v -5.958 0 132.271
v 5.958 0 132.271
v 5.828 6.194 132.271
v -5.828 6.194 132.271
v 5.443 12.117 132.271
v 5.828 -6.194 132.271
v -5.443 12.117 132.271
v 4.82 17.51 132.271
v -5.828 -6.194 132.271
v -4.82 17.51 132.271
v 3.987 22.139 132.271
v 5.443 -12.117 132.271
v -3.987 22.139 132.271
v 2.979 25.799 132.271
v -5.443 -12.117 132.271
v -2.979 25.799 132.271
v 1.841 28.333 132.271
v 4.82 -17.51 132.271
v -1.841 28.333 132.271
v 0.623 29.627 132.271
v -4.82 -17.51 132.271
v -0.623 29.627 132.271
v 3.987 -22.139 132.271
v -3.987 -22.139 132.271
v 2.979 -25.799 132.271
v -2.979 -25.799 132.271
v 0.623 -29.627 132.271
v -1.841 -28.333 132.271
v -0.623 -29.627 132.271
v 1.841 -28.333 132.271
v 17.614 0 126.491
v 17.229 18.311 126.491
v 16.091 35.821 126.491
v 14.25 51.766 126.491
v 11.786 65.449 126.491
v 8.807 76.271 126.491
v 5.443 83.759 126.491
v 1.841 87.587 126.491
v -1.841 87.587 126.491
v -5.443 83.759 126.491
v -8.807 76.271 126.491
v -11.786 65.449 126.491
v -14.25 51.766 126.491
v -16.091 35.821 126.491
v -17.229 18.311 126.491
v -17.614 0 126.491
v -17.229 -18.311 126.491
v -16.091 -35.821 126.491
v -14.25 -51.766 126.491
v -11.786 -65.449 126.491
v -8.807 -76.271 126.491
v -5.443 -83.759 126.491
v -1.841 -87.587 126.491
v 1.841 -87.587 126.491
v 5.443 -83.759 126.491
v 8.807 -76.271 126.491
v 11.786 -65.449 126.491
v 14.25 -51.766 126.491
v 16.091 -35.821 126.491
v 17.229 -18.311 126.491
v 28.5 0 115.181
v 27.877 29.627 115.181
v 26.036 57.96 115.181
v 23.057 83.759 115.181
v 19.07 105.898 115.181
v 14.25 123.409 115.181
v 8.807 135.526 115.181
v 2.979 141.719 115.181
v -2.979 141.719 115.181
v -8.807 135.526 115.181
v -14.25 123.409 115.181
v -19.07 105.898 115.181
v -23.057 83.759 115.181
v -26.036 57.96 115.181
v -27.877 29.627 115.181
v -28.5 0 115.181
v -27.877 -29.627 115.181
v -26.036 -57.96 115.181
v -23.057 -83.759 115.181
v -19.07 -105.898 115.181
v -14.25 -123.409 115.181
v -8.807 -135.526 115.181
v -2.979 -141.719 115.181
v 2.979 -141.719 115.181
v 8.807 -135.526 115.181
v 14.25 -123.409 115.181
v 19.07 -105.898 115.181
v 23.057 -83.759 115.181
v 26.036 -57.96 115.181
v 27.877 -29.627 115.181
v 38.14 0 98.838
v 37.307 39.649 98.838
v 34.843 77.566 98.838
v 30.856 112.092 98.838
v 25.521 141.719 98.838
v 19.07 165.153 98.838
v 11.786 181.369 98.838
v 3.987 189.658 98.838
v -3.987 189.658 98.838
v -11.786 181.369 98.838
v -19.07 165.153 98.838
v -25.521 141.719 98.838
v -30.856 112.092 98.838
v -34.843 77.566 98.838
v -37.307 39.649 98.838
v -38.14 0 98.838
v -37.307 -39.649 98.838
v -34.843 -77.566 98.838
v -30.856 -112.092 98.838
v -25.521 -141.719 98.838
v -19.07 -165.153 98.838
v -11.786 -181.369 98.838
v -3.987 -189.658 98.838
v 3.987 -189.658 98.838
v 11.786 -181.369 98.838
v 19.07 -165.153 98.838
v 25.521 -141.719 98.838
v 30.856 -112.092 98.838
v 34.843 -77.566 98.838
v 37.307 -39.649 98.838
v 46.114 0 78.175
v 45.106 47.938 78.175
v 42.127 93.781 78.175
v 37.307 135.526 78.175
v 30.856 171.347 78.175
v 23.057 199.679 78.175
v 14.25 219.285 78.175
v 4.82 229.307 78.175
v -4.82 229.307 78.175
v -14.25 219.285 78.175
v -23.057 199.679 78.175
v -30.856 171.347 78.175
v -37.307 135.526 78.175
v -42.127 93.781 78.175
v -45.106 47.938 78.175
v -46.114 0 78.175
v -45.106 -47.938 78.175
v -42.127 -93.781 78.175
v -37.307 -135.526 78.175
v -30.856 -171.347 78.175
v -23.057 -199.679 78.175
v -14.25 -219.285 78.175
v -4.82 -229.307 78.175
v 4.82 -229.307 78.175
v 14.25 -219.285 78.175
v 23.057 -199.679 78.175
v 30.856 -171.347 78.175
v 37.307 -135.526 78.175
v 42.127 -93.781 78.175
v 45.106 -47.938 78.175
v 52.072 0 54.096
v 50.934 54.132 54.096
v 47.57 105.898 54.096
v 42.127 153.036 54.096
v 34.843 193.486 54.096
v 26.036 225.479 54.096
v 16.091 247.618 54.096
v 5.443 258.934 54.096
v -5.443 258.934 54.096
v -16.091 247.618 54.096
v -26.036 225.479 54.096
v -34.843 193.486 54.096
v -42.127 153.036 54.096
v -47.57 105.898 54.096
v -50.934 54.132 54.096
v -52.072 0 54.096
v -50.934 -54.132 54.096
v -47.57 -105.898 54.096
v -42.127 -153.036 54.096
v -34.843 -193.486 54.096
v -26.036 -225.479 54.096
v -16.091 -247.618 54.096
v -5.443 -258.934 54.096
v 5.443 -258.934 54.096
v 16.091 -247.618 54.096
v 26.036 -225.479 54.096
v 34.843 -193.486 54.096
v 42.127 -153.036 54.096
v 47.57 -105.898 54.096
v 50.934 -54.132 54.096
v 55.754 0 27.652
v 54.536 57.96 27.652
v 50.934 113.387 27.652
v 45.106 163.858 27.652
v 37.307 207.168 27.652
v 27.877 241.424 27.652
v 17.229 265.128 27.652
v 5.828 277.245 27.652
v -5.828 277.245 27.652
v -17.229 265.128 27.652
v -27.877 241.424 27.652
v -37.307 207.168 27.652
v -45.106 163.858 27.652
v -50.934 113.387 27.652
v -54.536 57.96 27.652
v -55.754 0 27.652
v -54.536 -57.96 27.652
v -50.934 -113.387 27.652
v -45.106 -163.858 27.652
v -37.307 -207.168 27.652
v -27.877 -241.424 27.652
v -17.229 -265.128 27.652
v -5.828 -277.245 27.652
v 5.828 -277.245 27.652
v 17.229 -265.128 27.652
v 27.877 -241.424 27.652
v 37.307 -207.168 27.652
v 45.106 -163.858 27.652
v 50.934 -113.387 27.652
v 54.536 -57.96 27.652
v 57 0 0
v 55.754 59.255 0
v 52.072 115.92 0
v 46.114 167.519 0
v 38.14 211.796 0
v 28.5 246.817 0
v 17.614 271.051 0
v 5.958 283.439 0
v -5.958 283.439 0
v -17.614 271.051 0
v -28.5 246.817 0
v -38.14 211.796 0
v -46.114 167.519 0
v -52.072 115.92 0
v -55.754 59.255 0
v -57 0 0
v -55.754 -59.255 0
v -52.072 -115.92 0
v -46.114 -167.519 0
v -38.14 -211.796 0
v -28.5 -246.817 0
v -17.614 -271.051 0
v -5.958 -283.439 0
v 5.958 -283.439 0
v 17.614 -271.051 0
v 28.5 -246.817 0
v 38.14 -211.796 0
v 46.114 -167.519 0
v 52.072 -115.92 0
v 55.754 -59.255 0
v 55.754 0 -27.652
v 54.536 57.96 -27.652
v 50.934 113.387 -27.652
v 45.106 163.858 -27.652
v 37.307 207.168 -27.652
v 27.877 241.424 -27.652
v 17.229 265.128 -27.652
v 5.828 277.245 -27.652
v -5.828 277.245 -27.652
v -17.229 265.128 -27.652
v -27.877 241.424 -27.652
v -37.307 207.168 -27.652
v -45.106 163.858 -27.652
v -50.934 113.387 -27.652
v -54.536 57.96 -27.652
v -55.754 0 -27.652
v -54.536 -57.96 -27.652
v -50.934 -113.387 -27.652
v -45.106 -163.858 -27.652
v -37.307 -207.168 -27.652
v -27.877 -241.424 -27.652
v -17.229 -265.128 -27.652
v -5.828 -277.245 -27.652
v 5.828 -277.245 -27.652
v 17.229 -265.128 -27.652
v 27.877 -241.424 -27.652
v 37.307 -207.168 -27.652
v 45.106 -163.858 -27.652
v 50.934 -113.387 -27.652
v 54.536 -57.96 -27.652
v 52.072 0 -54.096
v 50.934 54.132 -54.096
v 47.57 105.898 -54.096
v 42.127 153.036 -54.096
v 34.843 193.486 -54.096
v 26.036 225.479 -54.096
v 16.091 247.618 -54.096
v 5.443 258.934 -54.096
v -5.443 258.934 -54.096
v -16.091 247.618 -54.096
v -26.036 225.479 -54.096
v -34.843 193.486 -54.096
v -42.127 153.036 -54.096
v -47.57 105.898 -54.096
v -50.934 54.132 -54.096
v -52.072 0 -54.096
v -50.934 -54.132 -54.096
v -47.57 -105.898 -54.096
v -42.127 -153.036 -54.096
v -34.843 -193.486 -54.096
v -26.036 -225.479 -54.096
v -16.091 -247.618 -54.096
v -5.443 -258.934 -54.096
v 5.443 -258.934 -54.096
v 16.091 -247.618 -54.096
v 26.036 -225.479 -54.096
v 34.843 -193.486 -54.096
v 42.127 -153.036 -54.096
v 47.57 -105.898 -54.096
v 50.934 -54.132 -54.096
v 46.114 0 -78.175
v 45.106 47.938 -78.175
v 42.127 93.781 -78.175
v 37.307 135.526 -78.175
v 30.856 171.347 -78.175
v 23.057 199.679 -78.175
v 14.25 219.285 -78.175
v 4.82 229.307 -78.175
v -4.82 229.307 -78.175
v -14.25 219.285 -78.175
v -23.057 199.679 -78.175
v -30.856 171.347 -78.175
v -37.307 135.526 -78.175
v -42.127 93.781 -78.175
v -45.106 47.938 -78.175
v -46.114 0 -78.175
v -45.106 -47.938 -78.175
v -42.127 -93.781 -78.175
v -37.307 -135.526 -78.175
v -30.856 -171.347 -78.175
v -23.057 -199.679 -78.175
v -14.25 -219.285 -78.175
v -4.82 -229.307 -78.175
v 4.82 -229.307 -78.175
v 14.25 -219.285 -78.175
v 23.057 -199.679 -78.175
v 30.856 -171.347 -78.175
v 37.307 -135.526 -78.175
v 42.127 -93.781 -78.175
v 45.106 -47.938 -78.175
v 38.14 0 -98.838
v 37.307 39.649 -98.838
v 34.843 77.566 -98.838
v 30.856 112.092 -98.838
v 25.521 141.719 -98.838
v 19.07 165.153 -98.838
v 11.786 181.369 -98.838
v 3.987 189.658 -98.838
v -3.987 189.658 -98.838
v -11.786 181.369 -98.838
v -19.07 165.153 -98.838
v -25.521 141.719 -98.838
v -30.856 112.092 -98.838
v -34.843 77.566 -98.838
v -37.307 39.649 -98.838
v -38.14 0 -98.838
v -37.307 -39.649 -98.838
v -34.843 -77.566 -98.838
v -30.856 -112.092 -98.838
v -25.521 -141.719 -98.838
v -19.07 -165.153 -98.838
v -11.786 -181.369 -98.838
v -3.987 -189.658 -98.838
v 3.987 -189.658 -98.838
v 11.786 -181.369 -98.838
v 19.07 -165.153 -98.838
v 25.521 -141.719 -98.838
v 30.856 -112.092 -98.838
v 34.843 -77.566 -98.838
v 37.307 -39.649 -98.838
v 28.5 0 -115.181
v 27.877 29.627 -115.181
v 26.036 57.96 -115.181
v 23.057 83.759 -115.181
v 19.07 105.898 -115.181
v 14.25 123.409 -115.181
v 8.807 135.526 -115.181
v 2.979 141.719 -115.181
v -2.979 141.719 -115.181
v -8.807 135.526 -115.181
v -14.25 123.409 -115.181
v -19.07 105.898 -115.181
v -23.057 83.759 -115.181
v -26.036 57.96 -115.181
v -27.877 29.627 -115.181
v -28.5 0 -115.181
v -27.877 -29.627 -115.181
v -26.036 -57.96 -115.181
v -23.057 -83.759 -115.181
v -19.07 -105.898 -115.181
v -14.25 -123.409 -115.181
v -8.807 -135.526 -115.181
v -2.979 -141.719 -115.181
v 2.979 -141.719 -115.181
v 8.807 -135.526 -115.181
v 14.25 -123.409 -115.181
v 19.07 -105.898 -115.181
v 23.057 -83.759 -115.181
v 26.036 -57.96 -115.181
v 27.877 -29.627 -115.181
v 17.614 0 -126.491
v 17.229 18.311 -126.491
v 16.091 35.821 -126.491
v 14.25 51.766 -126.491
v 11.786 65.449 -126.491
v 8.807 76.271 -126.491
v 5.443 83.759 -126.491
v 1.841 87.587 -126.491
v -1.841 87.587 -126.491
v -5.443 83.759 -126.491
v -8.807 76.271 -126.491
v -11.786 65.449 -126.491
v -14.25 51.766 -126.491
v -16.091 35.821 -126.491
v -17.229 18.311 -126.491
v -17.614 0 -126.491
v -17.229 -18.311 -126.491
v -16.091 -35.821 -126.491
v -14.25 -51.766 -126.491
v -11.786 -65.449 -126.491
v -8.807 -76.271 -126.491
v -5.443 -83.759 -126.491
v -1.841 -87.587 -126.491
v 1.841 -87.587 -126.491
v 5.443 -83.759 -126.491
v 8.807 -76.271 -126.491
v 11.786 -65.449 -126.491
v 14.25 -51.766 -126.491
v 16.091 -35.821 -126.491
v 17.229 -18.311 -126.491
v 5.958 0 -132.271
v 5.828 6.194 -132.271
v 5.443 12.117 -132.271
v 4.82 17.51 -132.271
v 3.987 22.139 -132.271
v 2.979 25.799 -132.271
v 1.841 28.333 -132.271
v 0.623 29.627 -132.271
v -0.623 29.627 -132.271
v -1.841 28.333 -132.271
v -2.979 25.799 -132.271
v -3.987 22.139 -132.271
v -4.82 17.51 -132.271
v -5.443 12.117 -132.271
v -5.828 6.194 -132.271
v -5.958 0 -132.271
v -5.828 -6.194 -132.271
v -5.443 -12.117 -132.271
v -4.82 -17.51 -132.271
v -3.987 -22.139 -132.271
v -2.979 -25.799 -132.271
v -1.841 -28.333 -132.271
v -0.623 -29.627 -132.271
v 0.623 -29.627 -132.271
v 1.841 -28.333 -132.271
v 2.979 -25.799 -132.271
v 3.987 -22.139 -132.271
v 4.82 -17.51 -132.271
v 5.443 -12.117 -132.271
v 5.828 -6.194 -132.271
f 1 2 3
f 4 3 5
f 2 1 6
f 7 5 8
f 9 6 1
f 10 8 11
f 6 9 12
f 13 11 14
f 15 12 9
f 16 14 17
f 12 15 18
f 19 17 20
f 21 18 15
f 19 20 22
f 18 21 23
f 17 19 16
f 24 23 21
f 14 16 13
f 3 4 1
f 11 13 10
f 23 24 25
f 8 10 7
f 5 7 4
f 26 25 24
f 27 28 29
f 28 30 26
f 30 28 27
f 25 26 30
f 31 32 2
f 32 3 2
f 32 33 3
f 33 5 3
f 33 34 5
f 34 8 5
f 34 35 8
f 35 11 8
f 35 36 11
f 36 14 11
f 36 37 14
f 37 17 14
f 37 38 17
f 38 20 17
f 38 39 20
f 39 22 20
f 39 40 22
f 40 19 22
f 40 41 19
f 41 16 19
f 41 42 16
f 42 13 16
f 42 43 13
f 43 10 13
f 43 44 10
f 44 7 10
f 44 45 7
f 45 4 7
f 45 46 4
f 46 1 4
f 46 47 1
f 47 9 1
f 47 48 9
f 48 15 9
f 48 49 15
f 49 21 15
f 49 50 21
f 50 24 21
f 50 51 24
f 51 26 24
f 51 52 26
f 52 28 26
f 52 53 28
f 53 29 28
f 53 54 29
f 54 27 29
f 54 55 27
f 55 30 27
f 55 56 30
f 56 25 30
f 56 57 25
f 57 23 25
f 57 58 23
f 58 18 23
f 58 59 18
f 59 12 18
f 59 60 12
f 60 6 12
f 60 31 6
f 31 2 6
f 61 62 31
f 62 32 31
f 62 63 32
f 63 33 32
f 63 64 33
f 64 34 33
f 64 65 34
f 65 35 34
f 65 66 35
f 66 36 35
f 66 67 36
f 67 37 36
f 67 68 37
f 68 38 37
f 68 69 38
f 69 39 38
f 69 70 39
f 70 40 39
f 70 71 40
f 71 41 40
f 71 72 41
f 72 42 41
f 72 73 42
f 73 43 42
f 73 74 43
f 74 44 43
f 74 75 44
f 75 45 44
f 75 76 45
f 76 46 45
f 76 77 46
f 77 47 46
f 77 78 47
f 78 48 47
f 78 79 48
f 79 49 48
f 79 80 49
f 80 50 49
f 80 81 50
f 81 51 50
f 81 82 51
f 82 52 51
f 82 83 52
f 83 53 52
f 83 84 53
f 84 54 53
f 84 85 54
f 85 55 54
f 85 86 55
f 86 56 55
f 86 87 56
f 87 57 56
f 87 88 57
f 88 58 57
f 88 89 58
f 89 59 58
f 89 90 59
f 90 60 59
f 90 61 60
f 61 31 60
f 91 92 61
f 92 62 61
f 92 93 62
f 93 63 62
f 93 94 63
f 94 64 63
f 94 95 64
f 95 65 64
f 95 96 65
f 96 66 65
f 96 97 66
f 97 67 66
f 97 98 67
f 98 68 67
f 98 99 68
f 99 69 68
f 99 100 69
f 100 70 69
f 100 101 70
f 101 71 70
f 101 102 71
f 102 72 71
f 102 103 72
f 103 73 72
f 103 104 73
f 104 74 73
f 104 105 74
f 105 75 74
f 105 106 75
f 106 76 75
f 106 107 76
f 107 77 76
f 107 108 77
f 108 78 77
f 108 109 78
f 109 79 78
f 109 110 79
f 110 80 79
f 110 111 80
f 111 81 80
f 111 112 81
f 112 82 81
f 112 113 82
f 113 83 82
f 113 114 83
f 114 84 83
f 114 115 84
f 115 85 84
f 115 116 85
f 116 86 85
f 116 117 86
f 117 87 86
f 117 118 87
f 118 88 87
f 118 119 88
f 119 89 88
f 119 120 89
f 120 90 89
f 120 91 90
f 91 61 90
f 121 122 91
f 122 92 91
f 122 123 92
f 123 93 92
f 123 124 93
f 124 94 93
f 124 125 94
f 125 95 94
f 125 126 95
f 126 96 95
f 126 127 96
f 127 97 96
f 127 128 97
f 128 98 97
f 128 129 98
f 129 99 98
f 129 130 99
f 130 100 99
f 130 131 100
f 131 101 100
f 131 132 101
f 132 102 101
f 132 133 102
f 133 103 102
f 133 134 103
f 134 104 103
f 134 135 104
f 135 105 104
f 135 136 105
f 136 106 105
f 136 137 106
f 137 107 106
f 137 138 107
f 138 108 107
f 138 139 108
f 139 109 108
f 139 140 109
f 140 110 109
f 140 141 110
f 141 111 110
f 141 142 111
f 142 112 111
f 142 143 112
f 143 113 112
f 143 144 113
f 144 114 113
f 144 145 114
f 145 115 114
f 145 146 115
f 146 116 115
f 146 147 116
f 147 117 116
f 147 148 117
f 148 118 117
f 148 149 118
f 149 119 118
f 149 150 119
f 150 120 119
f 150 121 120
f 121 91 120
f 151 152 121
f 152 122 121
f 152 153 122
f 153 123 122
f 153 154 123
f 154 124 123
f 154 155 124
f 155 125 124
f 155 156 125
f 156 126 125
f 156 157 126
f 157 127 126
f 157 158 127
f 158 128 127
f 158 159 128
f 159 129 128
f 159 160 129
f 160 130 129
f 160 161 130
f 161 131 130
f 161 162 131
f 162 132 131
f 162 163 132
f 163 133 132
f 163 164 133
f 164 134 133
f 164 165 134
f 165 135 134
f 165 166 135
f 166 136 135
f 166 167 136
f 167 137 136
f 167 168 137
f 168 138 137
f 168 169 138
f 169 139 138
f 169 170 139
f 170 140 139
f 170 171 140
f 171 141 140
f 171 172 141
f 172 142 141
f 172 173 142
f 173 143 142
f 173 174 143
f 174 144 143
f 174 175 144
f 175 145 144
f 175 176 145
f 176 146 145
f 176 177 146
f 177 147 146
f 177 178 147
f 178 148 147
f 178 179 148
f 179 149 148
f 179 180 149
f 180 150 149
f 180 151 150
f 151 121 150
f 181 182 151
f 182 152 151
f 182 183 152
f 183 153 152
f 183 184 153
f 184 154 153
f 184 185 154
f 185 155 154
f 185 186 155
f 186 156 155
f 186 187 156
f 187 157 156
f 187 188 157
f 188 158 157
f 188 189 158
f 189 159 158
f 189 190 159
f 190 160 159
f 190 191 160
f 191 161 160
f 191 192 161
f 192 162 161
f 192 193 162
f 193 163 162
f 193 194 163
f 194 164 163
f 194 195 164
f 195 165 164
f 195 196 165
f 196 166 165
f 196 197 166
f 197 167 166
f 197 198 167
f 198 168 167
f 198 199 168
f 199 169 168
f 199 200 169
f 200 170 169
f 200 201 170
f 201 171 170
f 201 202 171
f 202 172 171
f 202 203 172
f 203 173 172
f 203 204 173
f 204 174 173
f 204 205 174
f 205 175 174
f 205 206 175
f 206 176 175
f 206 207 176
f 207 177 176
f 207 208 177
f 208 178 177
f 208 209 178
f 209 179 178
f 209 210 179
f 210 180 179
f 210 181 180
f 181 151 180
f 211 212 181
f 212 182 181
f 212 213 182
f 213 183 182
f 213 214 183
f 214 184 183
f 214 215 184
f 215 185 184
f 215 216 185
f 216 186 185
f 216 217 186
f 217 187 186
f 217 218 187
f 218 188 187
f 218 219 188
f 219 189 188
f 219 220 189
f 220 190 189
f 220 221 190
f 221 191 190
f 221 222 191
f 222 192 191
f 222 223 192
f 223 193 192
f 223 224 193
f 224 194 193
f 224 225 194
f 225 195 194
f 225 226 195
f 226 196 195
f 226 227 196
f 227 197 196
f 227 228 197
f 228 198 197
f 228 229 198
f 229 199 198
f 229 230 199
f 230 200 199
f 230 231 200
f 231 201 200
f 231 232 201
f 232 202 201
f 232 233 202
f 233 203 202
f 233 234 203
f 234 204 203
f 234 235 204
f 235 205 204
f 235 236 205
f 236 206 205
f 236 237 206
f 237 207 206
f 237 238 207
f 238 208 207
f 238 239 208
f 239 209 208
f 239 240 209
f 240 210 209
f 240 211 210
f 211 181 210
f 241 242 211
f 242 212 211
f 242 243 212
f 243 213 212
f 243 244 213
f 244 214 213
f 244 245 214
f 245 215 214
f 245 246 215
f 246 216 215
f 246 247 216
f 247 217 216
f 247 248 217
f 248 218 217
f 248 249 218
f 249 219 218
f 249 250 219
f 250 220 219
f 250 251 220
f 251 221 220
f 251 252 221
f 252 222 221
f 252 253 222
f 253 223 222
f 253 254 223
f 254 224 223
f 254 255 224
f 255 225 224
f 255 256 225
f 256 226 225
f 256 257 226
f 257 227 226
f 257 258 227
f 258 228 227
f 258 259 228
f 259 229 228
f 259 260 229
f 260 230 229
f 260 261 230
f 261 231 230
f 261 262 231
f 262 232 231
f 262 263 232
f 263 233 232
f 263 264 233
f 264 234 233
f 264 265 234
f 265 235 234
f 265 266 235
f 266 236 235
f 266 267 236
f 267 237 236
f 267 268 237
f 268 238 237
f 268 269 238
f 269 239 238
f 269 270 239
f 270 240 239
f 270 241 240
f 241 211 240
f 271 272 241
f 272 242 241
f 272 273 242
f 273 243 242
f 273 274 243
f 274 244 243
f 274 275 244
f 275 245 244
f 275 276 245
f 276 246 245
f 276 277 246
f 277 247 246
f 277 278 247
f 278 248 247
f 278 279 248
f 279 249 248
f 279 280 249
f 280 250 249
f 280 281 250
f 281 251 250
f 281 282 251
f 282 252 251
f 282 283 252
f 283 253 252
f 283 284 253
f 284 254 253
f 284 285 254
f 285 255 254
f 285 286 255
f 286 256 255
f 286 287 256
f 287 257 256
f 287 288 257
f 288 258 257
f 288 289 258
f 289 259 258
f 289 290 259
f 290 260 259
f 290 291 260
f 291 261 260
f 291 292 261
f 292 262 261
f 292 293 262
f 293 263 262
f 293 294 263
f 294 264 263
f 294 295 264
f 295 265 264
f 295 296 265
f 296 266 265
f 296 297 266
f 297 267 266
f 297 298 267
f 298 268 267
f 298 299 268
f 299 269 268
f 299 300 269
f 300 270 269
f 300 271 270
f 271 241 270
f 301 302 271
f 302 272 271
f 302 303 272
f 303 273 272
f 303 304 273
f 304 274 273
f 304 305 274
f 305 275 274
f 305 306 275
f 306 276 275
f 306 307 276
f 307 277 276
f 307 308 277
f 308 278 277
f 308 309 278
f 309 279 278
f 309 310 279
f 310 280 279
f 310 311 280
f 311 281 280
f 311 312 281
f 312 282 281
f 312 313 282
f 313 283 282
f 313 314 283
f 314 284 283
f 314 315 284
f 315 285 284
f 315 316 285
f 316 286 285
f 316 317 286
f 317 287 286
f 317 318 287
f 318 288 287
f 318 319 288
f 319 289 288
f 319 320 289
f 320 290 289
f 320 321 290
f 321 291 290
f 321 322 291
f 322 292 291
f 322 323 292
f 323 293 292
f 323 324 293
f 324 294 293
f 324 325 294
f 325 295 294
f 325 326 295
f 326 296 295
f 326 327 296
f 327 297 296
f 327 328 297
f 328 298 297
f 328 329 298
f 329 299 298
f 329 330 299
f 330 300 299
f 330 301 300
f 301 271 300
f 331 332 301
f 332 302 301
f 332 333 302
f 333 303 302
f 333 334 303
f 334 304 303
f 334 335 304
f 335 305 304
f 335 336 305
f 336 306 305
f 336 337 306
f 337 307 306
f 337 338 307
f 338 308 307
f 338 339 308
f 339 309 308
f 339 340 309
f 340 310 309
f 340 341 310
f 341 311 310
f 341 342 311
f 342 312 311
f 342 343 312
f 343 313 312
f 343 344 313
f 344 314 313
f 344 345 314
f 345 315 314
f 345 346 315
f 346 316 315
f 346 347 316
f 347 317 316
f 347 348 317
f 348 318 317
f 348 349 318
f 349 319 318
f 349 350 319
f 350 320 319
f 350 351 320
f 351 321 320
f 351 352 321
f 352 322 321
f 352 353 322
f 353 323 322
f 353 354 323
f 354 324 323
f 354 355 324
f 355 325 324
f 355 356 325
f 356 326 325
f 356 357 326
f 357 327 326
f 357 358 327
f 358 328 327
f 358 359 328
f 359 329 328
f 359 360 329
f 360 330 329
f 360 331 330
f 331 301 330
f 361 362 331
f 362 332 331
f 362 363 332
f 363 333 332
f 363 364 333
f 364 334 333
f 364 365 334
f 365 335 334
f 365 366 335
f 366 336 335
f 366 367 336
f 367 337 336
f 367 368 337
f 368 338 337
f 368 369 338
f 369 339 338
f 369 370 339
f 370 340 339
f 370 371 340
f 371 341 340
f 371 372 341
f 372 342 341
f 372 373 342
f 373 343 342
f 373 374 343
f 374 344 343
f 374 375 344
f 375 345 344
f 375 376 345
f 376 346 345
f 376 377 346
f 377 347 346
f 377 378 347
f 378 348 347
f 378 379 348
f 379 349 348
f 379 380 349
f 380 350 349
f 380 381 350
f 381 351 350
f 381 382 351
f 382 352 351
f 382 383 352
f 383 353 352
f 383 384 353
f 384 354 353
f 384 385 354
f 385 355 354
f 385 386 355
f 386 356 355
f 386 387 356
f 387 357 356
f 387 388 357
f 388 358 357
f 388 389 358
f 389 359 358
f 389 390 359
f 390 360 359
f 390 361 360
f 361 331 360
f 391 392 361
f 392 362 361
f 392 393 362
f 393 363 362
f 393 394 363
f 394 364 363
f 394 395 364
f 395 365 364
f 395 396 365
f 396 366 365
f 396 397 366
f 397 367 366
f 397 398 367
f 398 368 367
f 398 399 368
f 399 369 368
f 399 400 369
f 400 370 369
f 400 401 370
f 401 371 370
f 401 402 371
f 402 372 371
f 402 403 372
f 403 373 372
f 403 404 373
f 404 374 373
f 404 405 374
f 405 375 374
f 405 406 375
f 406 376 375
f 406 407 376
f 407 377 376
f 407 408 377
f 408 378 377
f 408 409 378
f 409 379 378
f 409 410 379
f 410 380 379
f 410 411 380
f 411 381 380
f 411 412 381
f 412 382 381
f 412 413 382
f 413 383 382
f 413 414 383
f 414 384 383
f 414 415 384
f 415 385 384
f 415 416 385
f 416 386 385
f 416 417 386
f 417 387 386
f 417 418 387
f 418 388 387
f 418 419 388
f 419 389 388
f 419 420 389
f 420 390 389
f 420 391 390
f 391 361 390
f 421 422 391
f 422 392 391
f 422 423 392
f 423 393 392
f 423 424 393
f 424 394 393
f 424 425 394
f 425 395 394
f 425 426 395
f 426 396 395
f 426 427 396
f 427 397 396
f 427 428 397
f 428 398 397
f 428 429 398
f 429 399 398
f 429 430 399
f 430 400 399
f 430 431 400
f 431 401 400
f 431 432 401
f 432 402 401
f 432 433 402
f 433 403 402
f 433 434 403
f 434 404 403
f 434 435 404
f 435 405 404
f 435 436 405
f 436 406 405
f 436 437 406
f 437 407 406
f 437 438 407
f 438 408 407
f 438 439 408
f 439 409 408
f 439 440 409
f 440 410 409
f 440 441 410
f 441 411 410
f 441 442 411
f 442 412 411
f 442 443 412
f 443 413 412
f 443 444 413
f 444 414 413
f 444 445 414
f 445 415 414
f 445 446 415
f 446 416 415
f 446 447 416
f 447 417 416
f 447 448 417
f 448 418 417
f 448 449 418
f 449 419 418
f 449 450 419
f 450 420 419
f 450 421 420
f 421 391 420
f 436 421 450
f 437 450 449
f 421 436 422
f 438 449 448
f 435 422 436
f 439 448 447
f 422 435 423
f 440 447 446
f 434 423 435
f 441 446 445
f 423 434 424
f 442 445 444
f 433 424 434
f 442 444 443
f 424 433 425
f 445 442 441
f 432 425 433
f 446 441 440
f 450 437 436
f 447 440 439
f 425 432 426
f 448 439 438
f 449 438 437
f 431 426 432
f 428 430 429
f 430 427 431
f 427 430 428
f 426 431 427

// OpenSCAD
// Generated by SolidPython 1.0.1 on 2020-07-29 00:46:45


scale(v = [3, 15, 7]) {
	sphere(r = 19);
}
/***********************************************
*********      SolidPython code:      **********
************************************************
 
# import packages: SolidPython
from solid import *
from solid.utils import *
from itertools import chain, combinations, permutations


class Resize:

    def __init__(self, scad_file):
        self.scad_file = scad_file
        #self.scad_file = import_scad(scad_file)
        # cone/cylinder param:
        self.r1 = 0
        self.r2 = 0
        self.h = 0
        # rectangular prism param:
        self.w = 0
        self.l = 0
        # ellipse param:
        self.r = 0

    # import OpenScad code (file name corresponds to shape)


    # classify shape + parameters
    def assign(self, param1, param2, param3):
        if self.scad_file == 'cone.scad':
            self.r1 = param1
            self.r2 = param2
            self.h = param3
        elif self.scad_file == 'cylinder.scad':
            self.r1 = param1
            self.r2 = param2
            self.h = param3
        elif self.scad_file == 'rectangularPrism.scad':
            self.h = param1
            self.l = param2
            self.w = param3
        else:
            self.r = param1
            self.h = param2

    # resize parameters
    def iterate(self):
        x = range(3, 20, 2)
        i = 1
        if self.scad_file == 'cone.scad':
            tempList = list(permutations(x, 2))
            for temp in tempList:
                param1 = temp[0]
                param2 = temp[1]
                filepath = 'produced_scad_files/' + 'cone' + str(param1) + '_' + str(param2) + '_' + '.scad'
                scad_render_to_file(cylinder(h=param1, r1=param2, r2=0), filepath)

        elif self.scad_file == 'cylinder.scad':
            tempList = list(permutations(x, 3))
            for temp in tempList:
                param1 = temp[0]
                param2 = temp[1]
                filepath = 'produced_scad_files/' + 'cylinder' + str(param1) + '_' + str(param2) + '_' + '.scad'
                scad_render_to_file(cylinder(h=param1, r1=param2, r2=param2), filepath)

        elif self.scad_file == 'rectangularPrism.scad':
            tempList = list(permutations(x, 3))
            for temp in tempList:
                param1 = temp[0]
                param2 = temp[1]
                param3 = temp[2]
                filepath = 'produced_scad_files/' + 'rectangularPrism' + str(param1) + '_' + str(param2) + '_' + str(
                    param3) + '.scad'
                scad_render_to_file(cube(size=(param1, param2, param3)), filepath)

        elif self.scad_file == 'ellipse.scad':
            tempList = list(permutations(x, 4))
            for temp in tempList:
                param1 = temp[0]
                param2 = temp[1]
                param3 = temp[2]
                param4 = temp[3]
                filepath = 'produced_scad_files/' + 'ellipse' + str(param1) + '_' + str(param2) + '_' + str(param3) + '_' + str(param4) + '.scad'
                scad_render_to_file(scale([param1, param2, param3])(sphere(r=param4)), filepath)

    def render_to_scadfile(self):
        scad_render_to_file(scad, 'example.scad') 
 
************************************************/
